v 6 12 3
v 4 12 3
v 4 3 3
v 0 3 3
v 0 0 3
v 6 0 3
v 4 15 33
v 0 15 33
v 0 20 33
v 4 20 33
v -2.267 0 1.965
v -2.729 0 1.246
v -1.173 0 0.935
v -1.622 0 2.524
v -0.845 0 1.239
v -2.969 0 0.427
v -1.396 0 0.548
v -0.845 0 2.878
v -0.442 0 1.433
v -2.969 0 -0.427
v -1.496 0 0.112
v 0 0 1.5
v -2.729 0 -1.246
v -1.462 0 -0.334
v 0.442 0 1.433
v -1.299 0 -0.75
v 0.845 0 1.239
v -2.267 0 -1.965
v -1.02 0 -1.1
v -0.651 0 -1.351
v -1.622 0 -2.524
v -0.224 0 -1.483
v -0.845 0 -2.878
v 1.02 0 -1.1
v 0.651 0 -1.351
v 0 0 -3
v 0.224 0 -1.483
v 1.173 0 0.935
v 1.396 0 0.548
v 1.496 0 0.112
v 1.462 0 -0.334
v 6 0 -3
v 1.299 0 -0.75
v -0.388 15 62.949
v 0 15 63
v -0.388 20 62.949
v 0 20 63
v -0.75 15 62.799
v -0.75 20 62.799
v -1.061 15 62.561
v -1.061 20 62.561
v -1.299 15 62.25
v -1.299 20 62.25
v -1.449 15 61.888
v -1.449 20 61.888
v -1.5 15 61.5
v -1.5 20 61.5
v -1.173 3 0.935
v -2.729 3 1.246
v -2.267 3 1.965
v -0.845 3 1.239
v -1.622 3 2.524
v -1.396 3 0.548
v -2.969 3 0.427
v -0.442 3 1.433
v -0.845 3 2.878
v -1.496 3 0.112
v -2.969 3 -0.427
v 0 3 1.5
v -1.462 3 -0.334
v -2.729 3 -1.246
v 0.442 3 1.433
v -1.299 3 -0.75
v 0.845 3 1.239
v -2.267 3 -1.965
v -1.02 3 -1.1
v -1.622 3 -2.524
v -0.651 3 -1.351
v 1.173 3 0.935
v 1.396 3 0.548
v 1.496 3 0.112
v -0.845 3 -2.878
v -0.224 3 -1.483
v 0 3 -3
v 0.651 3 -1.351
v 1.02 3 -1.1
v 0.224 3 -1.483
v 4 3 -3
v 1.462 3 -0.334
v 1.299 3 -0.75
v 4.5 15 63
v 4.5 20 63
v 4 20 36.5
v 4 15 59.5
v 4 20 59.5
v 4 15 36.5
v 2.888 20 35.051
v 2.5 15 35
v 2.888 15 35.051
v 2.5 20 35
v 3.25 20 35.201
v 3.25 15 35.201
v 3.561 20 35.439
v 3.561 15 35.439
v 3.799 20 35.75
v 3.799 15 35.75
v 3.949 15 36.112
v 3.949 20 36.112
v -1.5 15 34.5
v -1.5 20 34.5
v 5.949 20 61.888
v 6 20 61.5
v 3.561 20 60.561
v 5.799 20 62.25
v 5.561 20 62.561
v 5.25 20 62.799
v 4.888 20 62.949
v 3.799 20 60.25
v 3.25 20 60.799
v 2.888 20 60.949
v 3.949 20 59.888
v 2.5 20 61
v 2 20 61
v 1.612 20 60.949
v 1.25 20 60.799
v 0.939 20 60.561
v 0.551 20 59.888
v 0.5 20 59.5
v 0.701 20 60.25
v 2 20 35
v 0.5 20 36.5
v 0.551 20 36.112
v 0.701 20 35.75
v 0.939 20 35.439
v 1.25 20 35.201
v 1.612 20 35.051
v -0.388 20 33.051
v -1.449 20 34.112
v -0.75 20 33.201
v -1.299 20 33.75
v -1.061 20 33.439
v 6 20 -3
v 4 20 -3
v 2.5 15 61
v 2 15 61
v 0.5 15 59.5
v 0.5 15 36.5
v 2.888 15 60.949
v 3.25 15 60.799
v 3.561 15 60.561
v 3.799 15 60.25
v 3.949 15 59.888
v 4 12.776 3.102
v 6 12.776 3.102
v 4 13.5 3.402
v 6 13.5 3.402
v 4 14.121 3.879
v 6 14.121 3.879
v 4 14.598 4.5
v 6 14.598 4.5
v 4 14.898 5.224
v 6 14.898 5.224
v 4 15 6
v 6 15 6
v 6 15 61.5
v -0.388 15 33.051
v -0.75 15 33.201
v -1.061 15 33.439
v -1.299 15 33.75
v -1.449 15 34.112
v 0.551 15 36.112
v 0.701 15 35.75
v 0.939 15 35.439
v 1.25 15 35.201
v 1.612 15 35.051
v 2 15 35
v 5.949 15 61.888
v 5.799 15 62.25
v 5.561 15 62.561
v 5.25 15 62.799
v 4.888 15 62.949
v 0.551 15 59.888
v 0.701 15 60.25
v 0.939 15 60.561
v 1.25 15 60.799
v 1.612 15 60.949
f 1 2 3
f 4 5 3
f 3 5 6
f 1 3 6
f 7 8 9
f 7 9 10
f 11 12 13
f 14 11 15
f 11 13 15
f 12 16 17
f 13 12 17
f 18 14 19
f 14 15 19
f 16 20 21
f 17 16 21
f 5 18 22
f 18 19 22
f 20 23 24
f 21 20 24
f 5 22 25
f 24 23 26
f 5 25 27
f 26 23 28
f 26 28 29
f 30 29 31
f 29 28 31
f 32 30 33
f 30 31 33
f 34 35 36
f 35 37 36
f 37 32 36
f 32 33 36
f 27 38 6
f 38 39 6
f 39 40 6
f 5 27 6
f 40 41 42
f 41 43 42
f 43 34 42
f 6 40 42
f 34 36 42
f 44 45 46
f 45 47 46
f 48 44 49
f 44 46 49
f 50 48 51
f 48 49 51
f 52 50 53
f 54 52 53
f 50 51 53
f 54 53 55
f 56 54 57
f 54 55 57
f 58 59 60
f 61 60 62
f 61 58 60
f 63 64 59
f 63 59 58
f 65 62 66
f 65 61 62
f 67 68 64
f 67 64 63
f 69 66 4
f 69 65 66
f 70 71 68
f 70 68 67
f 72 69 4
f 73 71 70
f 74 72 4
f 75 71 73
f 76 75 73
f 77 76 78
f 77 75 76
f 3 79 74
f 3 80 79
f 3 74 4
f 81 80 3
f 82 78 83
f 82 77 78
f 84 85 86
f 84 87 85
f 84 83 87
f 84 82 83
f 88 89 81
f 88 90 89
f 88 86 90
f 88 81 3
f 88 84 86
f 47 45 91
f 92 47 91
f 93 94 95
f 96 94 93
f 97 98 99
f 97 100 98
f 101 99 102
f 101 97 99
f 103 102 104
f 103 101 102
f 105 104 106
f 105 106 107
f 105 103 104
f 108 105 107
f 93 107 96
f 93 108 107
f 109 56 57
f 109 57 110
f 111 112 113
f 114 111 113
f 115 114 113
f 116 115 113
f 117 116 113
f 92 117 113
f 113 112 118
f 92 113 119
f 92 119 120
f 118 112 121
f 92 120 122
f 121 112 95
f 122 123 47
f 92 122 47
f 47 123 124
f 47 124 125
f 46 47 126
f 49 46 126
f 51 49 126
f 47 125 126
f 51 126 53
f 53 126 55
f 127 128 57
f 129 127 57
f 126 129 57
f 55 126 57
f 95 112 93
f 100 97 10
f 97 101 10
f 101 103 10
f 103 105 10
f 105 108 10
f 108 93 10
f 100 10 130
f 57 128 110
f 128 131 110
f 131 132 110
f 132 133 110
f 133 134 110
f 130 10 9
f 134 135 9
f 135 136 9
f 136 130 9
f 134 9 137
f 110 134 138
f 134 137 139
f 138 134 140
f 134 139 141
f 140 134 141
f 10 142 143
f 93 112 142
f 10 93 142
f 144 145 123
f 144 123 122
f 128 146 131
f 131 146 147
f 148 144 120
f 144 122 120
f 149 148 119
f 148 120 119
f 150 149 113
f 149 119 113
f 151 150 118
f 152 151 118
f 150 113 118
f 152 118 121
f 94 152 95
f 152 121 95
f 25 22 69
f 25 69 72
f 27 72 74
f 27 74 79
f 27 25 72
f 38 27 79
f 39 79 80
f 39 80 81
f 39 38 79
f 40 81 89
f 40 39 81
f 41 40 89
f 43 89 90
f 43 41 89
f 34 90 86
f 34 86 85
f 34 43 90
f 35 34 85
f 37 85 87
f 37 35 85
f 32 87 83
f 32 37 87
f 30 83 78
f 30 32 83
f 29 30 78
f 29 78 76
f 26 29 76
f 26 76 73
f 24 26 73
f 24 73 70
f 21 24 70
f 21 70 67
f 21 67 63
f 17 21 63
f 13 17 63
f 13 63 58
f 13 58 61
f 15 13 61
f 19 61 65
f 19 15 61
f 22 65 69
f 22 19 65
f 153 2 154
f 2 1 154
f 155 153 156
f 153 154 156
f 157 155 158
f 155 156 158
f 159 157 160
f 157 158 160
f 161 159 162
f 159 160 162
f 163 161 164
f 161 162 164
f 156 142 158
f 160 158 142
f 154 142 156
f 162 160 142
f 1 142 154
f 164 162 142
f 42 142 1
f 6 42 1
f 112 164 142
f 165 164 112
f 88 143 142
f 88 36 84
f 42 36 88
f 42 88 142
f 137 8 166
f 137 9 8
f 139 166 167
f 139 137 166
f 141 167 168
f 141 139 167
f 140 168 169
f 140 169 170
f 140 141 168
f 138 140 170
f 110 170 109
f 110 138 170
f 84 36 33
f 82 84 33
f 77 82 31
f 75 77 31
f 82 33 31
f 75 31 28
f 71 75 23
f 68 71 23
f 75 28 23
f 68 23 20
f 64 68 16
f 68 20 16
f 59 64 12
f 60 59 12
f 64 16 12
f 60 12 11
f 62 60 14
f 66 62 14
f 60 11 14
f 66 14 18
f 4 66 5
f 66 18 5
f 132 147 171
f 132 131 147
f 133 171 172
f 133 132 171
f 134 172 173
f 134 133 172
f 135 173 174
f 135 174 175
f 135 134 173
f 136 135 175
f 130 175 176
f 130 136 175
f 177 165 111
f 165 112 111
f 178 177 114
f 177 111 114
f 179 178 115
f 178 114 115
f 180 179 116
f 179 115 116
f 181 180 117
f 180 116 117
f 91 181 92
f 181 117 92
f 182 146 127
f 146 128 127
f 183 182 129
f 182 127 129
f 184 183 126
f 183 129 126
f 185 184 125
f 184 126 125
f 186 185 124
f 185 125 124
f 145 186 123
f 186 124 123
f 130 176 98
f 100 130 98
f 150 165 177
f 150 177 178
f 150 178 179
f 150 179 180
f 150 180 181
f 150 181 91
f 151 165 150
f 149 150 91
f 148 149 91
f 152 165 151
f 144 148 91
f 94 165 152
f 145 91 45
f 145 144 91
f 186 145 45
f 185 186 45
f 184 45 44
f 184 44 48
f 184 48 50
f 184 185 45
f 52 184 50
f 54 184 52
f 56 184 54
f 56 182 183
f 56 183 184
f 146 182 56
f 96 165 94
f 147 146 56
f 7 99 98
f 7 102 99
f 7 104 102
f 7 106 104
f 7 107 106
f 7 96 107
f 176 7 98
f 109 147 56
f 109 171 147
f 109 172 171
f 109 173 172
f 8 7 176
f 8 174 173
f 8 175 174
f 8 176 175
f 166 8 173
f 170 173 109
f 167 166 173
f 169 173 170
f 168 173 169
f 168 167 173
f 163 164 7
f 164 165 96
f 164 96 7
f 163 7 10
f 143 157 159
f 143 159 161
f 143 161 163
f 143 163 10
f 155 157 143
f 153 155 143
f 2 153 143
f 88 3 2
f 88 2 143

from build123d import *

# Parameters (mm, degrees)
SKETCH_1_R      = 3
SKETCH_1_R_2    = 1.5
EXTRUDE_1_DEPTH = 3
SKETCH_2_W      = 2
SKETCH_2_H      = 6
EXTRUDE_2_DEPTH = 15
SKETCH_3_W      = 3.5
SKETCH_3_H      = 26
EXTRUDE_3_DEPTH = 5
FILLET_1_R      = 3
FILLET_2_R      = 1.5


with BuildPart() as part:
    # 草图1 → 凸台-拉伸1 (new body)
    # profile 1 of 2: a face of its own
    with BuildSketch(Plane(origin=(0, 0, 0), x_dir=(1, 0, 0), z_dir=(0, 1, 0))):
        with BuildLine():
            Line((6, 3), (0, 3))
            ThreePointArc((0, 3), (2.121320344, 2.121320344), (3, 0))
            ThreePointArc((3, 0), (2.121320344, -2.121320344), (0, -3))
            Line((0, -3), (6, -3))
            Line((6, -3), (6, 3))
        make_face()
    # profile 2 of 2: a face of its own
    with BuildSketch(Plane(origin=(0, 0, 0), x_dir=(1, 0, 0), z_dir=(0, 1, 0))):
        Circle(SKETCH_1_R)
        with Locations(Location((0, 0, 0), (0, 0, 270))):
            Circle(SKETCH_1_R_2, mode=Mode.SUBTRACT)
    extrude(amount=EXTRUDE_1_DEPTH)

    # 草图2 → 凸台-拉伸2 (add)
    with BuildSketch(Plane(origin=(0, 0, 0), x_dir=(1, 0, 0), z_dir=(0, 1, 0))):
        with Locations((5, 0)):
            Rectangle(SKETCH_2_W, SKETCH_2_H)
    extrude(amount=EXTRUDE_2_DEPTH)

    # 草图3 → 凸台-拉伸3 (add)
    with BuildSketch(Plane(origin=(0, 15, 0), x_dir=(1, 0, 0), z_dir=(0, 1, 0))):
        Polygon((6, 3), (6, -63), (4, -63), (0.094051249, -63), (-1.5, -63), (-1.5, -33), (4, -33), (4, 3), align=None)
        with Locations((2.25, -48)):
            Rectangle(SKETCH_3_W, SKETCH_3_H, mode=Mode.SUBTRACT)
    extrude(amount=EXTRUDE_3_DEPTH)

    # 圆角1
    fillet_1_edges = [part.edges().sort_by_distance(p)[0] for p in [
        (5, 15, 3),
    ]]
    fillet(fillet_1_edges, radius=FILLET_1_R)

    # 圆角2
    fillet_2_edges = [part.edges().sort_by_distance(p)[0] for p in [
        (-1.5, 17.5, 33),
        (-1.5, 17.5, 63),
        (6, 17.5, 63),
        (4, 17.5, 35),
        (0.5, 17.5, 35),
        (0.5, 17.5, 61),
        (4, 17.5, 61),
    ]]
    fillet(fillet_2_edges, radius=FILLET_2_R)


solid = part.part
